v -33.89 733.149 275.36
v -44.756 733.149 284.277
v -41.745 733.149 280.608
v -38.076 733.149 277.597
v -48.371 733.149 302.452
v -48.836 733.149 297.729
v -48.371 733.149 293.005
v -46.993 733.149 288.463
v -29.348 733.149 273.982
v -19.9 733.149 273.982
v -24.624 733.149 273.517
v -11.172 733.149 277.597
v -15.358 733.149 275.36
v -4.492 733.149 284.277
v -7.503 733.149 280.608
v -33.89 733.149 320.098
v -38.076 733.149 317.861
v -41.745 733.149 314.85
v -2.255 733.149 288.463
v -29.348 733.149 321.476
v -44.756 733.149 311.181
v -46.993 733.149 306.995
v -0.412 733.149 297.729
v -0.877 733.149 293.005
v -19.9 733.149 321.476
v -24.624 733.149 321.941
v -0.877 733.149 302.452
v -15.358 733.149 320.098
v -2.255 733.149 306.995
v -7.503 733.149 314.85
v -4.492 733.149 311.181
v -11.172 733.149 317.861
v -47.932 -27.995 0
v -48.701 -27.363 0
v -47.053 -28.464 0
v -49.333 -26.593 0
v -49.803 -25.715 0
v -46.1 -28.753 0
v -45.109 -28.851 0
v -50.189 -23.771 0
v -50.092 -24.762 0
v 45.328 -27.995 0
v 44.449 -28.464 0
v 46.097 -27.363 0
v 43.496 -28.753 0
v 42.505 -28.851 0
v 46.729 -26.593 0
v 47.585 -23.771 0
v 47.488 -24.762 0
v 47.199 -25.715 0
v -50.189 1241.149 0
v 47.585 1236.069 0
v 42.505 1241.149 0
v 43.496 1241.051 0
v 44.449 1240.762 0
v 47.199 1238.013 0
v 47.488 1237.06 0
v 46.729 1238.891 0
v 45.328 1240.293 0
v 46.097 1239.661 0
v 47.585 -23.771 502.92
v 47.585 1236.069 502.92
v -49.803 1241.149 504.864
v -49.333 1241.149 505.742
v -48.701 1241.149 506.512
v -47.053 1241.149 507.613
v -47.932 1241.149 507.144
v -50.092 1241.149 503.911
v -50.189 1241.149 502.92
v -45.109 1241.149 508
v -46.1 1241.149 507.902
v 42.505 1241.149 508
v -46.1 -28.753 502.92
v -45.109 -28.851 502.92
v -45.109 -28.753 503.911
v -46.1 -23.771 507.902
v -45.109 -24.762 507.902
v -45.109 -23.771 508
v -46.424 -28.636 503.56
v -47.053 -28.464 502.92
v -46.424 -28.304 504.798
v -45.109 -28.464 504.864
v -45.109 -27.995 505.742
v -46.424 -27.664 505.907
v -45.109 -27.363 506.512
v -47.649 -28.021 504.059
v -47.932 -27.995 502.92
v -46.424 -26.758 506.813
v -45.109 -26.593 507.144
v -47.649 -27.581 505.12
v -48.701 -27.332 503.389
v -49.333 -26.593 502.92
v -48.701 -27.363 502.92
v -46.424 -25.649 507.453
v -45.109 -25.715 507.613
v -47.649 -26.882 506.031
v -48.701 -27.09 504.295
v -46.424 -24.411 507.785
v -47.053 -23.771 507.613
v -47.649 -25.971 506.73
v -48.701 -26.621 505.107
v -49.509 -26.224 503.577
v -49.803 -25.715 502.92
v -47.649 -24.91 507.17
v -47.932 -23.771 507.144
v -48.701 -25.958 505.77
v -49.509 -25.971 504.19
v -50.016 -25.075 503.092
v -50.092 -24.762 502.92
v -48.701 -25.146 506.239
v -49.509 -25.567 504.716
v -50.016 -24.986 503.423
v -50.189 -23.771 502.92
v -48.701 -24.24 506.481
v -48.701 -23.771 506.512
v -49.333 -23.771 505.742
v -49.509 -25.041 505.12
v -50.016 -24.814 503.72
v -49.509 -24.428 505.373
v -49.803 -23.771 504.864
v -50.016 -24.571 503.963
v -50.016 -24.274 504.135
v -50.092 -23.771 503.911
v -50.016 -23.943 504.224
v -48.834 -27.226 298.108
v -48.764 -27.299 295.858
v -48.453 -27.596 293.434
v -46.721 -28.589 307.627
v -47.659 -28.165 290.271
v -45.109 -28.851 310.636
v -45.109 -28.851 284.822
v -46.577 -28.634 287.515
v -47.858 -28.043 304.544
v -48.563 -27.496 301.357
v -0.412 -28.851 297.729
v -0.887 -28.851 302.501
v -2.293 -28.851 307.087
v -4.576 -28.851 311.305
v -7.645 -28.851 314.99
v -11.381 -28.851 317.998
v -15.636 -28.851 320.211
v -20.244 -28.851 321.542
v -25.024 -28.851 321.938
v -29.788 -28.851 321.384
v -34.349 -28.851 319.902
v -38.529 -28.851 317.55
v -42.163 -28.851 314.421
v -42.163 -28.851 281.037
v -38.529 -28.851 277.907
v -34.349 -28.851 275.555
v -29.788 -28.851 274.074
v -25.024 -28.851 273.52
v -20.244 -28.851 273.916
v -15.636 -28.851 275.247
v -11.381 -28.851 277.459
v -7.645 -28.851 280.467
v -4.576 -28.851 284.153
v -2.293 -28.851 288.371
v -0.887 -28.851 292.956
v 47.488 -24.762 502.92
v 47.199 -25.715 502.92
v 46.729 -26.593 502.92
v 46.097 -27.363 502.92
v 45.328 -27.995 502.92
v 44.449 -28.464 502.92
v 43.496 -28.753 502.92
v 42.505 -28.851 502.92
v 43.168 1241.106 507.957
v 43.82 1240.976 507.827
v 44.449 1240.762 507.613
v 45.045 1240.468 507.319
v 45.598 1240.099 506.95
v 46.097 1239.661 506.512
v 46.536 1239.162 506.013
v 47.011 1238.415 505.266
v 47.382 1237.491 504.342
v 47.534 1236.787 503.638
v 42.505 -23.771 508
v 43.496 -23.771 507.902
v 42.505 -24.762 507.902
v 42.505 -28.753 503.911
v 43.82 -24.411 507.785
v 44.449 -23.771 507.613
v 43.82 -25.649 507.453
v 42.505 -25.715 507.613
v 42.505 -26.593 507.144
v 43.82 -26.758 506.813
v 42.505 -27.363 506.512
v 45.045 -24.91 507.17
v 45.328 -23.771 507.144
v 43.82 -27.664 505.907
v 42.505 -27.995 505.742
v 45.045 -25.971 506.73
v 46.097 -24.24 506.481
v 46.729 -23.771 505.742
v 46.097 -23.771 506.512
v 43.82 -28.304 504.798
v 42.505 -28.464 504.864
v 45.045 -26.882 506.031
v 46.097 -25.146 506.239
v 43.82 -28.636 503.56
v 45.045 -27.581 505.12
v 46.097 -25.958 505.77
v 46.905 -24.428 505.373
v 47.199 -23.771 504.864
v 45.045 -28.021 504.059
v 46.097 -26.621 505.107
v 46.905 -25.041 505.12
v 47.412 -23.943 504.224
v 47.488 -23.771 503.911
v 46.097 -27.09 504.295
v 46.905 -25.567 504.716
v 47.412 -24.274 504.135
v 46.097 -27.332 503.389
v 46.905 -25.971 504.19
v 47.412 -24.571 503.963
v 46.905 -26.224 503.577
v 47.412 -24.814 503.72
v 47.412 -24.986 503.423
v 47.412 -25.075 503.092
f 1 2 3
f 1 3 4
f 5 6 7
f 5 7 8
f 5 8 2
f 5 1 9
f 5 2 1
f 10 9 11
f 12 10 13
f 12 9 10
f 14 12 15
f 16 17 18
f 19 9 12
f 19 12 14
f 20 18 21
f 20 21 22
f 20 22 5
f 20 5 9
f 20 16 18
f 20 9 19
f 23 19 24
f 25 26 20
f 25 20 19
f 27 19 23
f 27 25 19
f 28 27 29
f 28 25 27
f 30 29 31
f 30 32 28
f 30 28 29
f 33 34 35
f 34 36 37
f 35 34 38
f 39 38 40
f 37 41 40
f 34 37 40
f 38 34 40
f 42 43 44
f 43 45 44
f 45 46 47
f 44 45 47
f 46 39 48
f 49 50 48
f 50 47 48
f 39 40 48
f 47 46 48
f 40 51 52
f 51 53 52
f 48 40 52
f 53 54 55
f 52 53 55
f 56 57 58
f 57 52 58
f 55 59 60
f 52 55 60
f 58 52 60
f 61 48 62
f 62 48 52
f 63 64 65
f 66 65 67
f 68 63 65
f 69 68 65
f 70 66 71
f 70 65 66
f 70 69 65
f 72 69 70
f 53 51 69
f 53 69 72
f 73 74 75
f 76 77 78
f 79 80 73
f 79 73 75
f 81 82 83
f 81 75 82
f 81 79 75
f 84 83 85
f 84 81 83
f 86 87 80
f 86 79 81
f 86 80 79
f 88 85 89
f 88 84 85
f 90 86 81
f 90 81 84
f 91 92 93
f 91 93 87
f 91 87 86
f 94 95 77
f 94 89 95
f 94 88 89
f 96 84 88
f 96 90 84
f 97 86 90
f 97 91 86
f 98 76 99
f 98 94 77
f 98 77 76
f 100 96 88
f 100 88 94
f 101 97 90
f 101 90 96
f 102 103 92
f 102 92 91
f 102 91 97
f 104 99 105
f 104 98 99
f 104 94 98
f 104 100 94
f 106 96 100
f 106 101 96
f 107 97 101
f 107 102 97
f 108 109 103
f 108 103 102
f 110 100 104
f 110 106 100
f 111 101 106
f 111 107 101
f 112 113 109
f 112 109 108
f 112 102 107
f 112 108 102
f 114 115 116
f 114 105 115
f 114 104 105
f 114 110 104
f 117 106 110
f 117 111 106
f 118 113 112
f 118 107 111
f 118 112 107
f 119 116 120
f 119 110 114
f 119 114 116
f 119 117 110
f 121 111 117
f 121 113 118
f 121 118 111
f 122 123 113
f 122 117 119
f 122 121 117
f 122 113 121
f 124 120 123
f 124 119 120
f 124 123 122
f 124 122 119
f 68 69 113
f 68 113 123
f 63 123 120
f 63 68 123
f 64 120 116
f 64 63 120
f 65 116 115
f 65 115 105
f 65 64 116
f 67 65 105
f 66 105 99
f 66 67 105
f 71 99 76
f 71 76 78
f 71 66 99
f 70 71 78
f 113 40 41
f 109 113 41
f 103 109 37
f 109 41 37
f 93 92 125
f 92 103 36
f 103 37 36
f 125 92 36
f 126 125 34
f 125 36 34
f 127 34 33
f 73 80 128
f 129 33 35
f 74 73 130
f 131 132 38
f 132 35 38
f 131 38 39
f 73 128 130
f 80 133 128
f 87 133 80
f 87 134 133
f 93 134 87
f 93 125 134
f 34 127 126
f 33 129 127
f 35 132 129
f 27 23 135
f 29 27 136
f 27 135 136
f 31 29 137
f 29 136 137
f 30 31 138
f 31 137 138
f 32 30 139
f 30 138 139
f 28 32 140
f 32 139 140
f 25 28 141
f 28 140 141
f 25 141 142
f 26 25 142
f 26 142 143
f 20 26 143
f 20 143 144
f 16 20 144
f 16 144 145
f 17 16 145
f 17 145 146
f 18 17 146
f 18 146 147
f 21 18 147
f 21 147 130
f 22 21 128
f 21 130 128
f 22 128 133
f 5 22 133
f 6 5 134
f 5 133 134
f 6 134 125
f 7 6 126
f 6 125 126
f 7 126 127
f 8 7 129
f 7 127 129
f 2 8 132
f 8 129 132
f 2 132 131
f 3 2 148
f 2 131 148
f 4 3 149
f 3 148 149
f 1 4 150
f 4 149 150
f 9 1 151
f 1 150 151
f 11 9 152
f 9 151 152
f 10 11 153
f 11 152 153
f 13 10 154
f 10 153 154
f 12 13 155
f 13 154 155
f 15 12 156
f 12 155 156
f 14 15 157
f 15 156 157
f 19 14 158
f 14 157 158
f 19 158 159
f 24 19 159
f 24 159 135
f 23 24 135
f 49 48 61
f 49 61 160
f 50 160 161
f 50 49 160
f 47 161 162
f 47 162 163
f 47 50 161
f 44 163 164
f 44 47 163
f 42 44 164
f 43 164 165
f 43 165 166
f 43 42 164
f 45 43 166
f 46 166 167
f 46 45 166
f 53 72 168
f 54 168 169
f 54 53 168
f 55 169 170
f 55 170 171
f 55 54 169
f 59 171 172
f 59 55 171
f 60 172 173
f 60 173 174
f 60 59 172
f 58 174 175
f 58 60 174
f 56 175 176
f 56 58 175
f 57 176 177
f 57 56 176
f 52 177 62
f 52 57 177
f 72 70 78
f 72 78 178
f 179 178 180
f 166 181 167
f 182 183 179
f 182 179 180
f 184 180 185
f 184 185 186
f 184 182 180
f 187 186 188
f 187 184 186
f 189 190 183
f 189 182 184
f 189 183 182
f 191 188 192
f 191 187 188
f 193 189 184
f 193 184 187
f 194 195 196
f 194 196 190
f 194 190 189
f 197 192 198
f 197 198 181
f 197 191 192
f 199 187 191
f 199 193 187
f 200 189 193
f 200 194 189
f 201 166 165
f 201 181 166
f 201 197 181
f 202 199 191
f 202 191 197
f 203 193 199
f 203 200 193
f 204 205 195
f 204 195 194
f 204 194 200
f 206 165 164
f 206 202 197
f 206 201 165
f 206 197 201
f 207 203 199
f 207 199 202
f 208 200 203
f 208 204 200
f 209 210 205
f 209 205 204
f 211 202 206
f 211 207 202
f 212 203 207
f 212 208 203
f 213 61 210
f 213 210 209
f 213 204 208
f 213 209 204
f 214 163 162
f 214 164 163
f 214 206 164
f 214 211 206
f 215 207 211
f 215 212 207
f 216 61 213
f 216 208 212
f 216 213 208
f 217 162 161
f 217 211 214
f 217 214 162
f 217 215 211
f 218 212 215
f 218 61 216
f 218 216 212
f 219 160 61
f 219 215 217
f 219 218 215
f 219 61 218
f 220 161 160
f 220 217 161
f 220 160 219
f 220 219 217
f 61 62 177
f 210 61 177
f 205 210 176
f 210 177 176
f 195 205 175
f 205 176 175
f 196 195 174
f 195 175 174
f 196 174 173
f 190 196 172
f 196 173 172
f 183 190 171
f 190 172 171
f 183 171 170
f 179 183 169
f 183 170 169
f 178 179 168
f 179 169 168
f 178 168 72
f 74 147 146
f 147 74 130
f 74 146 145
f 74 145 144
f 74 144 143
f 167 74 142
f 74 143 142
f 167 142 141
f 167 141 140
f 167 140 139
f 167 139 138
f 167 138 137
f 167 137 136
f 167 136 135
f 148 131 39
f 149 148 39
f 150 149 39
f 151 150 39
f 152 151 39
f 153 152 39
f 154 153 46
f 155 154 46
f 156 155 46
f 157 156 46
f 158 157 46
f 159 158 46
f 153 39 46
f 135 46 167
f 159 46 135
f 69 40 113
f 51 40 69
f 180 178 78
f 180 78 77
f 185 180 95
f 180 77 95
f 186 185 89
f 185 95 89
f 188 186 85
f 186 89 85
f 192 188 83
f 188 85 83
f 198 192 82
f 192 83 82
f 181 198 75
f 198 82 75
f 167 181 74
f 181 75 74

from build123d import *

# Parameters (mm, degrees)
F0_W         = 97.7746620774
F0_H         = 1270
F1_DEPTH     = 508
F2_R         = 24.2123900656
F3_DEPTH     = 762
F4_T1_DEPTH  = 87.6146620774
F4_T3_DEPTH  = 1277.62
F4_T5_DEPTH  = 515.62
F4_T7_DEPTH  = 533.4
F4_S11_W     = 5.08
F4_S11_H     = 5.08
F4_T12_DEPTH = 5.08
F4_S17_W     = 5.08
F4_S17_H     = 5.08
F4_T18_DEPTH = 5.08


# Not quite as in the source:
# - a fillet or chamfer that OpenCascade refuses, or shapes differently, is made with other operations: its cross-section is extruded or revolved along the edge and cut away or added


with BuildPart() as f1:
    # F0 (on Top) → F1 (new body)
    with BuildSketch(Plane.XY):
        with Locations((-1.3020187616, 606.1489956826)):
            Rectangle(F0_W, F0_H)
    extrude(amount=F1_DEPTH)

    # F2 (on face) → F3 (cut)
    with BuildSketch(Plane.XZ.offset(28.8510043174)):
        with Locations((-24.6240980923, 297.7288961411)):
            Circle(F2_R)
    extrude(amount=-F3_DEPTH, mode=Mode.SUBTRACT)

    # F4: fillet of radius 5.08 on 6 edges, made by hand

    # F4_s2 → F4_t1 (cut)
    with BuildSketch(Plane.YZ.offset(-45.1093498003)):
        with BuildLine():
            ThreePointArc((-23.7710043174, 508), (-27.3631067658, 506.5121024484), (-28.8510043174, 502.92))
            Line((-28.8510043174, 502.92), (-28.8510043174, 508))
            Line((-28.8510043174, 508), (-23.7710043174, 508))
        make_face()
    extrude(amount=F4_T1_DEPTH, mode=Mode.SUBTRACT)

    # F4_s4 → F4_t3 (cut)
    with BuildSketch(Plane.XZ.offset(-1253.8489956826)):
        with BuildLine():
            ThreePointArc((47.5853122771, 502.92), (46.0974147255, 506.5121024484), (42.5053122771, 508))
            Line((42.5053122771, 508), (47.5853122771, 508))
            Line((47.5853122771, 508), (47.5853122771, 502.92))
        make_face()
        with BuildLine():
            ThreePointArc((-50.1893498003, 502.92), (-48.7014522488, 506.5121024484), (-45.1093498003, 508))
            Line((-45.1093498003, 508), (-50.1893498003, 508))
            Line((-50.1893498003, 508), (-50.1893498003, 502.92))
        make_face()
    extrude(amount=F4_T3_DEPTH, mode=Mode.SUBTRACT)

    # F4_s6 → F4_t5 (cut)
    with BuildSketch(Plane.XY.offset(-12.7)):
        with BuildLine():
            ThreePointArc((47.5853122771, -23.7710043174), (46.0974147255, -27.3631067658), (42.5053122771, -28.8510043174))
            Line((42.5053122771, -28.8510043174), (47.5853122771, -28.8510043174))
            Line((47.5853122771, -28.8510043174), (47.5853122771, -23.7710043174))
        make_face()
        with BuildLine():
            ThreePointArc((-50.1893498003, -23.7710043174), (-48.7014522488, -27.3631067658), (-45.1093498003, -28.8510043174))
            Line((-45.1093498003, -28.8510043174), (-50.1893498003, -28.8510043174))
            Line((-50.1893498003, -28.8510043174), (-50.1893498003, -23.7710043174))
        make_face()
    extrude(amount=F4_T5_DEPTH, mode=Mode.SUBTRACT)

    # F4_s8 → F4_t7 (cut)
    with BuildSketch(Plane.XY.offset(-12.7)):
        with BuildLine():
            ThreePointArc((42.5053122771, 1241.1489956826), (46.0974147255, 1239.661098131), (47.5853122771, 1236.0689956826))
            Line((47.5853122771, 1236.0689956826), (47.5853122771, 1241.1489956826))
            Line((47.5853122771, 1241.1489956826), (42.5053122771, 1241.1489956826))
        make_face()
    extrude(amount=F4_T7_DEPTH, mode=Mode.SUBTRACT)


with BuildPart() as f4_tool10:
    # F4_s11 → F4_t12 (new body)
    with BuildSketch(Plane.YZ.offset(-45.1093498003)):
        with Locations((-26.3110043174, 505.46)):
            Rectangle(F4_S11_W, F4_S11_H)
    extrude(amount=-F4_T12_DEPTH)

    # F4_s13 → F4_t14 (revolve, cut)
    with BuildSketch(Plane(origin=(-45.1093498003, -23.7710043174, 502.92), x_dir=(0, 0.7071067812, -0.7071067812), z_dir=(0, 0.7071067812, 0.7071067812))):
        with BuildLine():
            ThreePointArc((0, -5.08), (5.08, 0), (0, 5.08))
            Line((0, 5.08), (0, -5.08))
        make_face()
    revolve(axis=Axis((-45.1093498003, -23.7710043174, 502.92), (-1, 0, 0)), mode=Mode.SUBTRACT)


with BuildPart() as f1_1:
    add(f1.part)

    # F4_t9: cut F4_tool10
    add(f4_tool10.part, mode=Mode.SUBTRACT)


with BuildPart() as f4_tool16:
    # F4_s17 → F4_t18 (new body)
    with BuildSketch(Plane.YZ.offset(42.5053122771)):
        with Locations((-26.3110043174, 505.46)):
            Rectangle(F4_S17_W, F4_S17_H)
    extrude(amount=F4_T18_DEPTH)

    # F4_s19 → F4_t20 (revolve, cut)
    with BuildSketch(Plane(origin=(42.5053122771, -23.7710043174, 502.92), x_dir=(0, 0.7071067812, -0.7071067812), z_dir=(0, -0.7071067812, -0.7071067812))):
        with BuildLine():
            ThreePointArc((0, -5.08), (5.08, 0), (0, 5.08))
            Line((0, 5.08), (0, -5.08))
        make_face()
    revolve(axis=Axis((42.5053122771, -23.7710043174, 502.92), (1, 0, 0)), mode=Mode.SUBTRACT)


with BuildPart() as f1_2:
    add(f1_1.part)

    # F4_t15: cut F4_tool16
    add(f4_tool16.part, mode=Mode.SUBTRACT)


solid = f1_2.part
